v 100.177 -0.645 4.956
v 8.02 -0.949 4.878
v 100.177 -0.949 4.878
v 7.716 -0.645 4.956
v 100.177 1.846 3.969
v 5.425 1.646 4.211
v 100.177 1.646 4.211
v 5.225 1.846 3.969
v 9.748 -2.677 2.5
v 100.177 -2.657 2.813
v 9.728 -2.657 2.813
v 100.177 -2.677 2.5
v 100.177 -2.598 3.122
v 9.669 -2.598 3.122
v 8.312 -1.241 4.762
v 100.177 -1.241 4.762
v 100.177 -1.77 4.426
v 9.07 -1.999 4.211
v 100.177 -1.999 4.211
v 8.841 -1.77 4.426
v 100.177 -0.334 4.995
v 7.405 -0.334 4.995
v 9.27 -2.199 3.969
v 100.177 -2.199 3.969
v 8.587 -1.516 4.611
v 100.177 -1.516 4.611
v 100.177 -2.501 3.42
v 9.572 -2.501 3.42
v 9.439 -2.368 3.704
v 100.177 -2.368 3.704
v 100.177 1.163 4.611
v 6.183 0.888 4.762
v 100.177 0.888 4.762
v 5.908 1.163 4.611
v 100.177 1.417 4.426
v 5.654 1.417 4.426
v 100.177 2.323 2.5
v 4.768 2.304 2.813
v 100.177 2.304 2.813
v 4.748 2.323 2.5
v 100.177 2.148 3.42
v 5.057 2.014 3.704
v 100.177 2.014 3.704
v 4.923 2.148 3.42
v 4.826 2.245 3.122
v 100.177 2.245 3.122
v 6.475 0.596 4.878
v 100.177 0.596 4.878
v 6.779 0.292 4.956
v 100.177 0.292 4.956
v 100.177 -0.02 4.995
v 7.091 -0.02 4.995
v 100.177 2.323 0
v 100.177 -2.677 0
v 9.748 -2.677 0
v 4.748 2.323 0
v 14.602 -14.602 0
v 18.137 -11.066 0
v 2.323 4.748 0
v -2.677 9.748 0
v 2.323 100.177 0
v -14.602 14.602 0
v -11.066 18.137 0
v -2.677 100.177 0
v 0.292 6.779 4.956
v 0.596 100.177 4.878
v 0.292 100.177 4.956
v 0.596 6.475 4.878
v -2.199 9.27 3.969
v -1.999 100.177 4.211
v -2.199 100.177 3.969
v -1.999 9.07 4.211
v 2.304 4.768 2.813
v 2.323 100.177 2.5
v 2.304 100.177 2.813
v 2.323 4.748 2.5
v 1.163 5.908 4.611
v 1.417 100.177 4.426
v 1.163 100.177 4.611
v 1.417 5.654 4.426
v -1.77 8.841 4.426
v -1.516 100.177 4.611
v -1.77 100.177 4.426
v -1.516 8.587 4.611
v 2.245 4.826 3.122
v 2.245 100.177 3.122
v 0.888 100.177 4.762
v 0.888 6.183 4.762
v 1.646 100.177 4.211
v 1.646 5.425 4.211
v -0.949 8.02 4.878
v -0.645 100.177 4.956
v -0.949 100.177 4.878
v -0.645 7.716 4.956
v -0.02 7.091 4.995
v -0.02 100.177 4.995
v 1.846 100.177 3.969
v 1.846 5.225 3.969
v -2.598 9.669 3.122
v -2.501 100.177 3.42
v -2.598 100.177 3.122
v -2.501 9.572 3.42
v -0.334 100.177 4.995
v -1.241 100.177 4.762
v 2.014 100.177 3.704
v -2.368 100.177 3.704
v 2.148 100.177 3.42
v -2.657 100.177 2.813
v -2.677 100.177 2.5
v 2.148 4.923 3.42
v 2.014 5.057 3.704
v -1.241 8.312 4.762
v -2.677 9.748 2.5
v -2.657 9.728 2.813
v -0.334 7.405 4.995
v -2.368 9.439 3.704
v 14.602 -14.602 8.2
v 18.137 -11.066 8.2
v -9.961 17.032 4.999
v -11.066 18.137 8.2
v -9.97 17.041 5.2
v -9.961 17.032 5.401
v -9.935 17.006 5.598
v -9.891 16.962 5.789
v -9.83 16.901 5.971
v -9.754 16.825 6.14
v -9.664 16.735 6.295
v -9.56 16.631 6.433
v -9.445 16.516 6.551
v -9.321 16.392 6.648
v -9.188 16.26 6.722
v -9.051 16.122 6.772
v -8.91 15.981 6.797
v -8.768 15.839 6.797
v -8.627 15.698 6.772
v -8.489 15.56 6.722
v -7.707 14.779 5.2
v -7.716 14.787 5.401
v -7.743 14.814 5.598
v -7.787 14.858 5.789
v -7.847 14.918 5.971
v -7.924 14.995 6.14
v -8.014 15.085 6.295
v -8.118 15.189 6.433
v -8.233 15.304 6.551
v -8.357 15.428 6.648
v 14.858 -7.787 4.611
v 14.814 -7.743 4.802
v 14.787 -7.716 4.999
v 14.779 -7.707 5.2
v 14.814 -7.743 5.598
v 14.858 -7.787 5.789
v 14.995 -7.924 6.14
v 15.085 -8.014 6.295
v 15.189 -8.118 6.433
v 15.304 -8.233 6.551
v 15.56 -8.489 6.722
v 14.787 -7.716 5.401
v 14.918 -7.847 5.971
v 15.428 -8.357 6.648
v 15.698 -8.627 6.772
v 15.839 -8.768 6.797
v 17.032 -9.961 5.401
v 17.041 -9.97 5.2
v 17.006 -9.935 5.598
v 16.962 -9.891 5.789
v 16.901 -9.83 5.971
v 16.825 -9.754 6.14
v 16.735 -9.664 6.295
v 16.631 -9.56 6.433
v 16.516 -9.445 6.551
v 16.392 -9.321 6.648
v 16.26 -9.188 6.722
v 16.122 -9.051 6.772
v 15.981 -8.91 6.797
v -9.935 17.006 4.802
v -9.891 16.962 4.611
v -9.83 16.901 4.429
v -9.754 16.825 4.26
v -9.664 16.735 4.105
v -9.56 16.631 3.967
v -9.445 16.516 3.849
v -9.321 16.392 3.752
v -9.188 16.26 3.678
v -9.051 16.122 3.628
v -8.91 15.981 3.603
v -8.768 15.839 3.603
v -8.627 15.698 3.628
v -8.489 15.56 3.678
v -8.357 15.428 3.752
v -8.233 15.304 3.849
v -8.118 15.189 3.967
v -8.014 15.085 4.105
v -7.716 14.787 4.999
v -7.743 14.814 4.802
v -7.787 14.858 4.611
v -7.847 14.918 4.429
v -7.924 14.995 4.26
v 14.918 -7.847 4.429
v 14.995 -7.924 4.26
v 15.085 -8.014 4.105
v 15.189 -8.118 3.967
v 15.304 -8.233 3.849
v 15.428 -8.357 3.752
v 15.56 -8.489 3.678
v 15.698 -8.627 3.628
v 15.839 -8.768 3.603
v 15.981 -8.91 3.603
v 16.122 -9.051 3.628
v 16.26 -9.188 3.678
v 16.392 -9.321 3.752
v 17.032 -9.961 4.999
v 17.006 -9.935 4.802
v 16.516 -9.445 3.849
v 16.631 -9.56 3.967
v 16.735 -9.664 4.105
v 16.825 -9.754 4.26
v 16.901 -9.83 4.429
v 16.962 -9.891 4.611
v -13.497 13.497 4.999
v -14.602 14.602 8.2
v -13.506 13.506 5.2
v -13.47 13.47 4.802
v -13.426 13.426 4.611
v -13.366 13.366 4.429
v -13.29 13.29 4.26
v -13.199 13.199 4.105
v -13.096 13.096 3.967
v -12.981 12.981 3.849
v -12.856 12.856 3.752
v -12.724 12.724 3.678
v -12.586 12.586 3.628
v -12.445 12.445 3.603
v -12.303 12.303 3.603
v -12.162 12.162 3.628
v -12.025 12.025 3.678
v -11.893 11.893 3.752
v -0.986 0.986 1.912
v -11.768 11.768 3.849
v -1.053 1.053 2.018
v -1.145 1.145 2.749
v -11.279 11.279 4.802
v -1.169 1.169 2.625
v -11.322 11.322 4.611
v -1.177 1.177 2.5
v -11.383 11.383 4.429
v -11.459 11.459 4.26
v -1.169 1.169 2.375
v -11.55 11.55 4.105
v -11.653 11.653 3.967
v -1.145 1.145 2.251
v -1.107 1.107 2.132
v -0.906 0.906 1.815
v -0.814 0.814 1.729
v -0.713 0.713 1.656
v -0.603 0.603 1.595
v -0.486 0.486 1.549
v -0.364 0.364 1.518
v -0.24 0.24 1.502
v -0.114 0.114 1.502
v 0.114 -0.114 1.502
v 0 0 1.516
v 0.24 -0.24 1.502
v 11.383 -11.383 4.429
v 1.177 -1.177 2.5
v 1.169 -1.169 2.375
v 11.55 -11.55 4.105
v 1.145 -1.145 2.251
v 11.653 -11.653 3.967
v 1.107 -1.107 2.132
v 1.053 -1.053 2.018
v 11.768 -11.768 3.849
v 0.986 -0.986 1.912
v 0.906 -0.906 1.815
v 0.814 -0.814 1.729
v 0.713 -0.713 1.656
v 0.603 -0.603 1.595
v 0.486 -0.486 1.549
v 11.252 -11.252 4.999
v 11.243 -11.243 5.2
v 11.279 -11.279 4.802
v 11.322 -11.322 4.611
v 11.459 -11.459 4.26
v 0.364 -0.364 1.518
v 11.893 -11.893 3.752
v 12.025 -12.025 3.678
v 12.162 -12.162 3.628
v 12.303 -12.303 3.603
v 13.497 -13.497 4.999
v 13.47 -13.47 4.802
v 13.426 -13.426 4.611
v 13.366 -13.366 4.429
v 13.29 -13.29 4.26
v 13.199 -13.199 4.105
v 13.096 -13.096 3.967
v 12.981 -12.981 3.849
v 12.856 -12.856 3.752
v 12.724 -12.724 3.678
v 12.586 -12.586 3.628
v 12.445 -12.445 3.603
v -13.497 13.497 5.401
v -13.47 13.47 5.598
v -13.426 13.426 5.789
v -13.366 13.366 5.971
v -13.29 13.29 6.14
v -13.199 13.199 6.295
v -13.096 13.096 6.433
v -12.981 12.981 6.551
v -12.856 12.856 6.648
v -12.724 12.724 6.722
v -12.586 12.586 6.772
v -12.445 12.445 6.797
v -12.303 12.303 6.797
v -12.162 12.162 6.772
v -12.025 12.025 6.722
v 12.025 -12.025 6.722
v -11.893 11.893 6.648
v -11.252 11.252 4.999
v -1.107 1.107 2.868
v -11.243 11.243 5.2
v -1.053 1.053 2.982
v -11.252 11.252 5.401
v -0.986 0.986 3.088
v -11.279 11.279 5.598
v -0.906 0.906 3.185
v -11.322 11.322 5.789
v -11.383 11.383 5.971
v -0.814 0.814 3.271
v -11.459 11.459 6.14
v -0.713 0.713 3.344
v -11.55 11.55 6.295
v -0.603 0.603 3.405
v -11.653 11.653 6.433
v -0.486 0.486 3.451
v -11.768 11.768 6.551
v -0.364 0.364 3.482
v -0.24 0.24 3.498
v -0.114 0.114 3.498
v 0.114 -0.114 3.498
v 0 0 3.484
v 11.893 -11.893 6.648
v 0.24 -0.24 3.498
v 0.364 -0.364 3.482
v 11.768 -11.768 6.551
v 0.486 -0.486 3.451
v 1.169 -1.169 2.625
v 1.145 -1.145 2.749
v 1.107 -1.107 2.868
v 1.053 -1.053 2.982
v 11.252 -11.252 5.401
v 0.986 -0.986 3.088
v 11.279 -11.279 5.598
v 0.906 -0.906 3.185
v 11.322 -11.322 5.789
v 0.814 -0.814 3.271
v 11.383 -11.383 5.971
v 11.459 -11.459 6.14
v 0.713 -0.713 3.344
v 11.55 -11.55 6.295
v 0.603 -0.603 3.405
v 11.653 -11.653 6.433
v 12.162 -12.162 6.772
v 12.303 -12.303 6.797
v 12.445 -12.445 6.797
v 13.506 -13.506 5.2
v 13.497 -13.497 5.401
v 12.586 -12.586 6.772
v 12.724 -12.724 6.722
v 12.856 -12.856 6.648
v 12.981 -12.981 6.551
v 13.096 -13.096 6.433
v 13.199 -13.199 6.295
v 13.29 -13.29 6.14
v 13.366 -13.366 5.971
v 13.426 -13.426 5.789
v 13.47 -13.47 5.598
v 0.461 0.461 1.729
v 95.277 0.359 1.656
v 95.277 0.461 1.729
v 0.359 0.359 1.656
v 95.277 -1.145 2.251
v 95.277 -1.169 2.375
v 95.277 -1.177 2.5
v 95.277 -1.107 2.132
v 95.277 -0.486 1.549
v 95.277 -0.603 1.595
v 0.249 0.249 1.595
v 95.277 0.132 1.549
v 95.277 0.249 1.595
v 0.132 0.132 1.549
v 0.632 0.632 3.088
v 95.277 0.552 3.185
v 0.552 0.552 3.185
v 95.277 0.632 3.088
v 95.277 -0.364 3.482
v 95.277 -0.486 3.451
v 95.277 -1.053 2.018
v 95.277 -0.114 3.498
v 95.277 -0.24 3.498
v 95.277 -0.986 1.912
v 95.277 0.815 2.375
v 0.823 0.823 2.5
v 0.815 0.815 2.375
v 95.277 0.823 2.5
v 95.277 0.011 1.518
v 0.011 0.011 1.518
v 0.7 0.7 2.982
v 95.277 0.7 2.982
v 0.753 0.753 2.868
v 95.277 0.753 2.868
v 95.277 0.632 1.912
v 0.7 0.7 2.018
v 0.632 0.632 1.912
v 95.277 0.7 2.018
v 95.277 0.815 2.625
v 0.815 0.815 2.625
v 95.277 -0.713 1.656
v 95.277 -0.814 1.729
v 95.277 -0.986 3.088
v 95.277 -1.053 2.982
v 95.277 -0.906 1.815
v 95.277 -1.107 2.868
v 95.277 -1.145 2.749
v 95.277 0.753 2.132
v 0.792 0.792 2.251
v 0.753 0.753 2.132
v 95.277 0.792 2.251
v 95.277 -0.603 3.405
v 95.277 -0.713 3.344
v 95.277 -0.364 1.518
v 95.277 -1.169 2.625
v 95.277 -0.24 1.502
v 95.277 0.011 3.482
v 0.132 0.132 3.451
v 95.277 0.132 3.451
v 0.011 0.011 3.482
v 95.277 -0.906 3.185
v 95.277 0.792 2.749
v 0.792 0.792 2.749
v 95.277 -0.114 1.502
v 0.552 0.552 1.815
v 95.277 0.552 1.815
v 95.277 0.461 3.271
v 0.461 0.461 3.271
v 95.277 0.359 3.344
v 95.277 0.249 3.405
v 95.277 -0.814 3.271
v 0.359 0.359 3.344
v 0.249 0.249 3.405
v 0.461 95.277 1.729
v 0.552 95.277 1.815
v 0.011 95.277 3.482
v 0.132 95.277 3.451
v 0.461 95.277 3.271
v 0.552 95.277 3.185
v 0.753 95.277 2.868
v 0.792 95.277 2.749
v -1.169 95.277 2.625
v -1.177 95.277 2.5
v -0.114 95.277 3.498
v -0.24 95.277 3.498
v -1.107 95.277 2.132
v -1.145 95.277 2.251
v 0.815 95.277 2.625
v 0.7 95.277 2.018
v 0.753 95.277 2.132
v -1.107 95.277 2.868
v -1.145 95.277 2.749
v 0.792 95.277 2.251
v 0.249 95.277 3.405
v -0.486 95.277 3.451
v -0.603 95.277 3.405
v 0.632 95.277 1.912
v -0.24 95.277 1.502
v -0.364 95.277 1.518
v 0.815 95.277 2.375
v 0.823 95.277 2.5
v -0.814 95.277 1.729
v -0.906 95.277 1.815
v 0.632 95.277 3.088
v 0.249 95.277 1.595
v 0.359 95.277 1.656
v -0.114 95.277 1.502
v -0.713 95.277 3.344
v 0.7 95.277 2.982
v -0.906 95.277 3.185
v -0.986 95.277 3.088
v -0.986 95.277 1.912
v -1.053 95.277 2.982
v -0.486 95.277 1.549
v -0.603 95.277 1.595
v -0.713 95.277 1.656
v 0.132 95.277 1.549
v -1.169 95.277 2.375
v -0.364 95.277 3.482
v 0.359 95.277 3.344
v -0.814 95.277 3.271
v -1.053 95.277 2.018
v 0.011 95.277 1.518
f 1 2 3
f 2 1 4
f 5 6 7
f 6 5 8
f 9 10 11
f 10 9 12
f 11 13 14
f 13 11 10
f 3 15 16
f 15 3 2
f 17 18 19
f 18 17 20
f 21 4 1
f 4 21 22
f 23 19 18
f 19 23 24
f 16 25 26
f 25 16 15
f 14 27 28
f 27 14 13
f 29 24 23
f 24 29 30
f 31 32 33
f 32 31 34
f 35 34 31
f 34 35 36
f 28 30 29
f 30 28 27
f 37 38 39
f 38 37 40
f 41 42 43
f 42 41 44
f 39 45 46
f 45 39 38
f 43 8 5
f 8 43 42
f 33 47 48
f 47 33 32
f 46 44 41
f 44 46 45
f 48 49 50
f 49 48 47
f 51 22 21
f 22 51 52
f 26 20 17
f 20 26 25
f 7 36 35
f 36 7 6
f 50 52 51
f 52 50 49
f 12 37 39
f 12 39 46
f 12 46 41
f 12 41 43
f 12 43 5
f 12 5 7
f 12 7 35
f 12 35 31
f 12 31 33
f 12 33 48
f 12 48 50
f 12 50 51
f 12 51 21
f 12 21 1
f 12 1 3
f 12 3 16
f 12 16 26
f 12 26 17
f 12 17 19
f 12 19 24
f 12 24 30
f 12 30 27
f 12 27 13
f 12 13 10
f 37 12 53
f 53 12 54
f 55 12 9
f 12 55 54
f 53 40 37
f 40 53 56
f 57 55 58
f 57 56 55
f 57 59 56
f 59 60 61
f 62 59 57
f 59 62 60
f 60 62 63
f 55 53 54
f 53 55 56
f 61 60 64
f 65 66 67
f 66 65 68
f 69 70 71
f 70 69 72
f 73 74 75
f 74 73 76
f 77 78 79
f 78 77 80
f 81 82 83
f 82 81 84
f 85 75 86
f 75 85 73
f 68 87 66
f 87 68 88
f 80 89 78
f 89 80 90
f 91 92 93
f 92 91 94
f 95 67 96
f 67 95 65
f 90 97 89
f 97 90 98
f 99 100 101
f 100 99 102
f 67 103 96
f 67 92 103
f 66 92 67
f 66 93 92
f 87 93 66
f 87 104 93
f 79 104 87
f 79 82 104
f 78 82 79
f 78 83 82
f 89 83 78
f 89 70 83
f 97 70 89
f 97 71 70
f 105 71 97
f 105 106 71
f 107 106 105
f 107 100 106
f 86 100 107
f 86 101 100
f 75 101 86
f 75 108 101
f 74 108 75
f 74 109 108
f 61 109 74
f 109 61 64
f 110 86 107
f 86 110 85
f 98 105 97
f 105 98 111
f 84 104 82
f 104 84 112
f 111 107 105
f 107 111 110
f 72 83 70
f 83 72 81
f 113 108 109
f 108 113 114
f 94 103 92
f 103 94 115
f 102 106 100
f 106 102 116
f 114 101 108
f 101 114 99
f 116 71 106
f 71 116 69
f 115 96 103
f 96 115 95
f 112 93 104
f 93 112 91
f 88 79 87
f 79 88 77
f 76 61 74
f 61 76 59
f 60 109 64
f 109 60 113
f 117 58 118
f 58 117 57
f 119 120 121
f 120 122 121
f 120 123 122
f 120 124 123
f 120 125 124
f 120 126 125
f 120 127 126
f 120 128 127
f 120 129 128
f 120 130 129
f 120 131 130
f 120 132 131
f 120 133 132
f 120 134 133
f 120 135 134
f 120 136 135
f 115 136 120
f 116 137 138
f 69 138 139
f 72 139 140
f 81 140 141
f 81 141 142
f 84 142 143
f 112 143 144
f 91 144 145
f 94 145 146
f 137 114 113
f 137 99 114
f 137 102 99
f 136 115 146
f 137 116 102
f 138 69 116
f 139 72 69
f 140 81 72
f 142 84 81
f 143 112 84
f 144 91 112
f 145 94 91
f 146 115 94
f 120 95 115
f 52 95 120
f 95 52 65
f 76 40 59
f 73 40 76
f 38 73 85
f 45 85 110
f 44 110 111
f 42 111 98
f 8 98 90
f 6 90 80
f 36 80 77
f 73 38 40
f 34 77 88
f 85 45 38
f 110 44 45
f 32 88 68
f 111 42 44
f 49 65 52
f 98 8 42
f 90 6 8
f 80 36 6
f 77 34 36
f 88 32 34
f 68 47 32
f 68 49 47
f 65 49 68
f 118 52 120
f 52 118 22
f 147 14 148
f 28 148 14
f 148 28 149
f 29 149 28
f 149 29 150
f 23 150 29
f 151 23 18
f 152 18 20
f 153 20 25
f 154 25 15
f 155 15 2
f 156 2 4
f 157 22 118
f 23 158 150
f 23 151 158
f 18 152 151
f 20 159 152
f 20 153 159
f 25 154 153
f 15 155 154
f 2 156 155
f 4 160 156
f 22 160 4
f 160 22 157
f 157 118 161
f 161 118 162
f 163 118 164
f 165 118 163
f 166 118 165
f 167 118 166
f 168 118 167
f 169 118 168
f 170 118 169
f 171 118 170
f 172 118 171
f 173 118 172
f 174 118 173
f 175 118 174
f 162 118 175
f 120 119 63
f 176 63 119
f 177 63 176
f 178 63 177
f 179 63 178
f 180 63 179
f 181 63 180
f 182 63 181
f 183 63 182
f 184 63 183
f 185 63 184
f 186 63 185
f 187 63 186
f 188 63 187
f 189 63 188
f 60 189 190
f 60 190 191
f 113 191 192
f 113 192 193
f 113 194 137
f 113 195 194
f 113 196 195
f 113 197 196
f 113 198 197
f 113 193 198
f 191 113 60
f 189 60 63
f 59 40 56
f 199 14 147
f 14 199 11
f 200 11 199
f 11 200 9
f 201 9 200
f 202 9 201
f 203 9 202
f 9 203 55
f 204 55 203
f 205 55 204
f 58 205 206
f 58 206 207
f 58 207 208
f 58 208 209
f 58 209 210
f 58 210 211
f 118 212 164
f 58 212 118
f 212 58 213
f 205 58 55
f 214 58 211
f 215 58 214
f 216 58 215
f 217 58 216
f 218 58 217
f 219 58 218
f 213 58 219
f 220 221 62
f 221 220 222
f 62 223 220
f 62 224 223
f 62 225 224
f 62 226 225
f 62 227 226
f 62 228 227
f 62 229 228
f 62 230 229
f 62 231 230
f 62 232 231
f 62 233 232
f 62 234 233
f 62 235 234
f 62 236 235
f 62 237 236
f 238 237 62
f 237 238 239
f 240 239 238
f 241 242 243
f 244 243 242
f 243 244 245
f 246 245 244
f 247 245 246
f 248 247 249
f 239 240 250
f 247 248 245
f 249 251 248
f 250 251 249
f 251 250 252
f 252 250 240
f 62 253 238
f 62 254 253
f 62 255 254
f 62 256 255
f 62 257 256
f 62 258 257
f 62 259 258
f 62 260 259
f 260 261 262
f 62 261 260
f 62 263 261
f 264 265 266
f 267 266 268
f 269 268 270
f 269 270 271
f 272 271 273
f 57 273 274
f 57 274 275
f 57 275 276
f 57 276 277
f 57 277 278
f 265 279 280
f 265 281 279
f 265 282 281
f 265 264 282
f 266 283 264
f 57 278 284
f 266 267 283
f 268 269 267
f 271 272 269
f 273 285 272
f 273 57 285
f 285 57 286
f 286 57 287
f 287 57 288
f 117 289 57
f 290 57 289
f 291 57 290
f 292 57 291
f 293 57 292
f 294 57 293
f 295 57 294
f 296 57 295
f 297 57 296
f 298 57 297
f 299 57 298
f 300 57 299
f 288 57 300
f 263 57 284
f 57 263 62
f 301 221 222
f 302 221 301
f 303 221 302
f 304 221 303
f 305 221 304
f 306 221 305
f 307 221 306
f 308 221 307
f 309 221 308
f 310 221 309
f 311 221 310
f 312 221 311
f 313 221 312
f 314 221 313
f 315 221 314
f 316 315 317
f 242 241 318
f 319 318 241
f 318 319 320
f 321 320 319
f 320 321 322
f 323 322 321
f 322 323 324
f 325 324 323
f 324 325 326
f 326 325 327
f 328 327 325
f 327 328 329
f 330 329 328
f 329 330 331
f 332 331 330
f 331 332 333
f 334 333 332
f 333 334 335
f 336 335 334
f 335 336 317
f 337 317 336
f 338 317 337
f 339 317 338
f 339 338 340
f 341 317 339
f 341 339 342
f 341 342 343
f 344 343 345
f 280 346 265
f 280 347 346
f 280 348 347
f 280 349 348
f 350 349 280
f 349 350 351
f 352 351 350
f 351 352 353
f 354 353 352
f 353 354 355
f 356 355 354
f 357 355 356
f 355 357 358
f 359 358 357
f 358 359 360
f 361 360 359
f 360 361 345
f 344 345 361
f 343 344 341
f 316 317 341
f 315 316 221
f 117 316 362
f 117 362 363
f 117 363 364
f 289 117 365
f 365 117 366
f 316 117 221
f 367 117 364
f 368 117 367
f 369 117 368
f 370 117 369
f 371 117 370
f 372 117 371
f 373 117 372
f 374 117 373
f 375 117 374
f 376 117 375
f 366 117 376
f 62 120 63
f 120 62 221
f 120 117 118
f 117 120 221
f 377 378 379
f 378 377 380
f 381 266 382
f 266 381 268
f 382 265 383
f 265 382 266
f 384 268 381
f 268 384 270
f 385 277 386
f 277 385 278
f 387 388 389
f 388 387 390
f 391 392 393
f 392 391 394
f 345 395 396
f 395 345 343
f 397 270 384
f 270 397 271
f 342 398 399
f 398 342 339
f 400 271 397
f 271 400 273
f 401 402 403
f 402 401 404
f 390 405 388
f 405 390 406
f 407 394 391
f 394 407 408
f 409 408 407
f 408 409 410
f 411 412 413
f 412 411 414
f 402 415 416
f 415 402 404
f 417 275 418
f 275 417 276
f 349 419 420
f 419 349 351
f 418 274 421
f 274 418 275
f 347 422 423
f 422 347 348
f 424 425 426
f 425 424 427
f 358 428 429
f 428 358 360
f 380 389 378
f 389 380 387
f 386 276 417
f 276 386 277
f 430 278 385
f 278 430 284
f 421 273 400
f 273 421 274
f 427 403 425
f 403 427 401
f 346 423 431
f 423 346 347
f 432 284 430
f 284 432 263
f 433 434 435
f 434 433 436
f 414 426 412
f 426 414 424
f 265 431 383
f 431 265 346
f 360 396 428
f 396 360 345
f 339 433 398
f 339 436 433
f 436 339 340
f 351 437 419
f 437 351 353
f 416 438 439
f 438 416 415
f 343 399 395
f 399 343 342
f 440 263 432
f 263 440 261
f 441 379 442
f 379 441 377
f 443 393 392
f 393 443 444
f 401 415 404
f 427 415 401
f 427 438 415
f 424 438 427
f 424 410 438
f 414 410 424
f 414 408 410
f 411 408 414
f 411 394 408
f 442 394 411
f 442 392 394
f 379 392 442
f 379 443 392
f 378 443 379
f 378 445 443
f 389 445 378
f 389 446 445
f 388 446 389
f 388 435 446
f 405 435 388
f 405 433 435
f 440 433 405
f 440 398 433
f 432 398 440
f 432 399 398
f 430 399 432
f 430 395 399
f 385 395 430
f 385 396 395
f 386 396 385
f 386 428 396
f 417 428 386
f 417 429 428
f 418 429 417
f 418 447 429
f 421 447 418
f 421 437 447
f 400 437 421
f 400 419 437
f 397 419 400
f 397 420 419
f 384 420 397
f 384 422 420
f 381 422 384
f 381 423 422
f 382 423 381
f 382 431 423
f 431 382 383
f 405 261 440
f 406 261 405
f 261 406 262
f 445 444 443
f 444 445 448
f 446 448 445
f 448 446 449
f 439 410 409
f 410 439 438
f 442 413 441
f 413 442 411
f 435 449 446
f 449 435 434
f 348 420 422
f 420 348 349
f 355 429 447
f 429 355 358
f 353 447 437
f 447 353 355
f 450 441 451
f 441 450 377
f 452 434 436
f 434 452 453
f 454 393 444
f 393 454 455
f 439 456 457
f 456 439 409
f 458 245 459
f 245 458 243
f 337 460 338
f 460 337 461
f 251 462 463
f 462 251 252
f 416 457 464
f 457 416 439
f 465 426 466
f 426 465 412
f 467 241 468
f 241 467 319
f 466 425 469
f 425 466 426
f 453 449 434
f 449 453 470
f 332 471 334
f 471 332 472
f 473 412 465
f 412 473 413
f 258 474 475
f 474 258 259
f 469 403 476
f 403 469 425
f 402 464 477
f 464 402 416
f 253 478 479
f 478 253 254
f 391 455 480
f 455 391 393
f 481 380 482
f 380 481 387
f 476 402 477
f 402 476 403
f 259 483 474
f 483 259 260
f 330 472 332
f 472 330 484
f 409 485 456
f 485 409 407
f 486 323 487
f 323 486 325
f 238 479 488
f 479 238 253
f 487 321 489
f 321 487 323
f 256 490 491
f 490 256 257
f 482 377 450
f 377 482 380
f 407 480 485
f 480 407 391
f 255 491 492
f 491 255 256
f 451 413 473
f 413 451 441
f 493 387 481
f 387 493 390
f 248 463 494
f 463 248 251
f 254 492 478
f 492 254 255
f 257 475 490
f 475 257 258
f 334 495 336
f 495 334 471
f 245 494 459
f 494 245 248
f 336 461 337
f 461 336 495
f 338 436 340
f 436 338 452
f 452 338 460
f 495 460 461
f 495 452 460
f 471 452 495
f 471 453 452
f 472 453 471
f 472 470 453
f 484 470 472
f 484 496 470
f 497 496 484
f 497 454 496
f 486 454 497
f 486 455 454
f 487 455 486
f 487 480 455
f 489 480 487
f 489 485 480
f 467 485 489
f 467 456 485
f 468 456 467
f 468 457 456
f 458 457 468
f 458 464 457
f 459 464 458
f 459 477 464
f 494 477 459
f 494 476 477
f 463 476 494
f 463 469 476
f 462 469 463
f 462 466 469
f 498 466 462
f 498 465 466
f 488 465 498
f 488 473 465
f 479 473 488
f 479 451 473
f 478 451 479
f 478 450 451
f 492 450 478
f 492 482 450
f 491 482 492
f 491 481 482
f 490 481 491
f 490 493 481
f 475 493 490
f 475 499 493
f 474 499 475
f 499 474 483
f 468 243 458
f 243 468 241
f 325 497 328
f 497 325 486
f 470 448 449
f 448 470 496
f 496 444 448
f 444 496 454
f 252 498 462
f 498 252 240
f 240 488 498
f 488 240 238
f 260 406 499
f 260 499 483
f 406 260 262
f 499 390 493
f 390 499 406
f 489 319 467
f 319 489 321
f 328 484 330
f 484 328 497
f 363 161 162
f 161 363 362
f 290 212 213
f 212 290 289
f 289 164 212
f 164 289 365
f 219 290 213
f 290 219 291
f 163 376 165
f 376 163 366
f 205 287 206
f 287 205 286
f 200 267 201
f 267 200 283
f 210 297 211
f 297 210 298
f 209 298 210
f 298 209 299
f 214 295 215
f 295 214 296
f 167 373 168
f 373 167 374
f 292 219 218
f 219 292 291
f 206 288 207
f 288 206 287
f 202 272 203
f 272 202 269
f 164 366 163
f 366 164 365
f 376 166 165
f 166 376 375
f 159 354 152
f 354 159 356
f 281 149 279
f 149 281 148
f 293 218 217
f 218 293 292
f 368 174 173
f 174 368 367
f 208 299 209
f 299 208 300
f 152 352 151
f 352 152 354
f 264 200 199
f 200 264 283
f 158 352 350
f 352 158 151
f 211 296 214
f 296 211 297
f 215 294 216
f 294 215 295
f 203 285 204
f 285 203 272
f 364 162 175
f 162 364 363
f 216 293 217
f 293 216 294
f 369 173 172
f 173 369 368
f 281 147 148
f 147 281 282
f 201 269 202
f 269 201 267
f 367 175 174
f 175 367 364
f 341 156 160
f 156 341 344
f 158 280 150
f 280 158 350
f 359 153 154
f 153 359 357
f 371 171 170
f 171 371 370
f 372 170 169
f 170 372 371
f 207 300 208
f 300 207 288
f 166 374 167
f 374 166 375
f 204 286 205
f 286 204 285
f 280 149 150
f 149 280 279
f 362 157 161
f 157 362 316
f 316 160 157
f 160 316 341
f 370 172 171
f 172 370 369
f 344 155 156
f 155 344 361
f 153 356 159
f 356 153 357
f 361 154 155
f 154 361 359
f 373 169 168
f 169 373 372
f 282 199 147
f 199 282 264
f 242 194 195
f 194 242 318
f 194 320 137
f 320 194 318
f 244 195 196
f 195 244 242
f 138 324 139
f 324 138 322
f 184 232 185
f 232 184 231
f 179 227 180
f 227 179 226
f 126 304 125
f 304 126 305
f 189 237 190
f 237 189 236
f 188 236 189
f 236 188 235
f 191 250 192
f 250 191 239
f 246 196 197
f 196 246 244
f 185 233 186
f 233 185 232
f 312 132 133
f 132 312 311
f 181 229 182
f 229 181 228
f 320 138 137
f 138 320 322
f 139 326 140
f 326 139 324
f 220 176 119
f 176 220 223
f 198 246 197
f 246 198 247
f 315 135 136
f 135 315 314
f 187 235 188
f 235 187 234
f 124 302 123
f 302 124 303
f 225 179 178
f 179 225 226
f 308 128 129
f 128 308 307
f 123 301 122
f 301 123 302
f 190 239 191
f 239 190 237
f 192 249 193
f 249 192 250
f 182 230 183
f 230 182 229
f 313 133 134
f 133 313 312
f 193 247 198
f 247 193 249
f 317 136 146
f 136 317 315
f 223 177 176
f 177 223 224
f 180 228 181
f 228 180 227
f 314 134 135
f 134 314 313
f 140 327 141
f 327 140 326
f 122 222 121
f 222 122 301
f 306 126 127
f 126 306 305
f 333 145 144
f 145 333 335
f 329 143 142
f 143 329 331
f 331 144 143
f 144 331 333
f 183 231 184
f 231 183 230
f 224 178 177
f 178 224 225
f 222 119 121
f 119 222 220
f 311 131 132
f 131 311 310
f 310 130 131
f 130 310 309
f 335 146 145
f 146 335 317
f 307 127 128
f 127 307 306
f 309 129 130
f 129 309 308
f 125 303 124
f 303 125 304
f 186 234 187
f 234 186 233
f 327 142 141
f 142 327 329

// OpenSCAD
$fn = 50*1;

EPS = 0.1*1;

// Inner diameter of antenna tubes
DIA_ANT_TUBE = 2; // [1:5]
DIA_ANT_OUTER_TUBE = DIA_ANT_TUBE + 3;

// Length of tubes (the last 5 mm will be solid, so make this your antenna length +5)
TUBE_LEN = 100; // [20:200]
TUBE_CTR_OFFS = 0.25*1;

// Diameter of mounting holes
DIA_MOUNT_HOLES = 3.1; // [2:4]

// Mounting holes distance 
WIDTH_MOUNT_HOLES = 35; // [20:60]

// Width of the base
BASE_WIDTH = DIA_ANT_OUTER_TUBE + DIA_MOUNT_HOLES + 0.1; 

BASE_LENGTH = WIDTH_MOUNT_HOLES + 2 * DIA_MOUNT_HOLES + 0.1;
BASE_HEIGHT = 5*1;

rotate([-90, 0, -45]) 
difference() {
	union() {
		// base
		translate([-BASE_LENGTH/2, -BASE_WIDTH, 0])
			cube ([BASE_LENGTH, BASE_WIDTH, BASE_HEIGHT]);
		// tubes
		translate([TUBE_CTR_OFFS, -DIA_ANT_OUTER_TUBE/2, 0])
			rotate([0, 45, 0]) {
				cylinder(d = DIA_ANT_OUTER_TUBE, h = TUBE_LEN);
				translate([-DIA_ANT_OUTER_TUBE/2, 0, 0])
					cube([DIA_ANT_OUTER_TUBE, DIA_ANT_OUTER_TUBE/2, TUBE_LEN]);
			}
		translate([-TUBE_CTR_OFFS, -DIA_ANT_OUTER_TUBE/2, 0])
			rotate([0, -45, 0]) {
				cylinder(d = DIA_ANT_OUTER_TUBE, h = TUBE_LEN);
				translate([-DIA_ANT_OUTER_TUBE/2, 0, 0])
					cube([DIA_ANT_OUTER_TUBE, DIA_ANT_OUTER_TUBE/2, TUBE_LEN]);
			}
	}
	// hollow tubes
	translate([TUBE_CTR_OFFS, -DIA_ANT_OUTER_TUBE/2, 0])
		rotate([0, 45, 0])
			translate([0, 0, -10 - EPS])
					cylinder(d = DIA_ANT_TUBE, h = TUBE_LEN + 10 + 2 * EPS - 5);
	translate([-TUBE_CTR_OFFS, -DIA_ANT_OUTER_TUBE/2, 0])
		rotate([0, -45, 0])
			translate([0, 0, -10 - EPS])
					cylinder(d = DIA_ANT_TUBE, h = TUBE_LEN + 10 + 2 * EPS - 5);
	// cut below base
	translate([-BASE_LENGTH/2 - EPS, -BASE_WIDTH - EPS, -5]) cube ([BASE_LENGTH + 2*EPS, BASE_WIDTH + 2*EPS, 5]);
	// mounting holes
	translate([WIDTH_MOUNT_HOLES/2, -BASE_WIDTH + 3, - EPS])
		cylinder(d = DIA_MOUNT_HOLES + 0.1, h = BASE_HEIGHT + 2*EPS);
	translate([-WIDTH_MOUNT_HOLES/2, -BASE_WIDTH + 3, - EPS])
		cylinder(d = DIA_MOUNT_HOLES + 0.1, h = BASE_HEIGHT + 2*EPS);
}
